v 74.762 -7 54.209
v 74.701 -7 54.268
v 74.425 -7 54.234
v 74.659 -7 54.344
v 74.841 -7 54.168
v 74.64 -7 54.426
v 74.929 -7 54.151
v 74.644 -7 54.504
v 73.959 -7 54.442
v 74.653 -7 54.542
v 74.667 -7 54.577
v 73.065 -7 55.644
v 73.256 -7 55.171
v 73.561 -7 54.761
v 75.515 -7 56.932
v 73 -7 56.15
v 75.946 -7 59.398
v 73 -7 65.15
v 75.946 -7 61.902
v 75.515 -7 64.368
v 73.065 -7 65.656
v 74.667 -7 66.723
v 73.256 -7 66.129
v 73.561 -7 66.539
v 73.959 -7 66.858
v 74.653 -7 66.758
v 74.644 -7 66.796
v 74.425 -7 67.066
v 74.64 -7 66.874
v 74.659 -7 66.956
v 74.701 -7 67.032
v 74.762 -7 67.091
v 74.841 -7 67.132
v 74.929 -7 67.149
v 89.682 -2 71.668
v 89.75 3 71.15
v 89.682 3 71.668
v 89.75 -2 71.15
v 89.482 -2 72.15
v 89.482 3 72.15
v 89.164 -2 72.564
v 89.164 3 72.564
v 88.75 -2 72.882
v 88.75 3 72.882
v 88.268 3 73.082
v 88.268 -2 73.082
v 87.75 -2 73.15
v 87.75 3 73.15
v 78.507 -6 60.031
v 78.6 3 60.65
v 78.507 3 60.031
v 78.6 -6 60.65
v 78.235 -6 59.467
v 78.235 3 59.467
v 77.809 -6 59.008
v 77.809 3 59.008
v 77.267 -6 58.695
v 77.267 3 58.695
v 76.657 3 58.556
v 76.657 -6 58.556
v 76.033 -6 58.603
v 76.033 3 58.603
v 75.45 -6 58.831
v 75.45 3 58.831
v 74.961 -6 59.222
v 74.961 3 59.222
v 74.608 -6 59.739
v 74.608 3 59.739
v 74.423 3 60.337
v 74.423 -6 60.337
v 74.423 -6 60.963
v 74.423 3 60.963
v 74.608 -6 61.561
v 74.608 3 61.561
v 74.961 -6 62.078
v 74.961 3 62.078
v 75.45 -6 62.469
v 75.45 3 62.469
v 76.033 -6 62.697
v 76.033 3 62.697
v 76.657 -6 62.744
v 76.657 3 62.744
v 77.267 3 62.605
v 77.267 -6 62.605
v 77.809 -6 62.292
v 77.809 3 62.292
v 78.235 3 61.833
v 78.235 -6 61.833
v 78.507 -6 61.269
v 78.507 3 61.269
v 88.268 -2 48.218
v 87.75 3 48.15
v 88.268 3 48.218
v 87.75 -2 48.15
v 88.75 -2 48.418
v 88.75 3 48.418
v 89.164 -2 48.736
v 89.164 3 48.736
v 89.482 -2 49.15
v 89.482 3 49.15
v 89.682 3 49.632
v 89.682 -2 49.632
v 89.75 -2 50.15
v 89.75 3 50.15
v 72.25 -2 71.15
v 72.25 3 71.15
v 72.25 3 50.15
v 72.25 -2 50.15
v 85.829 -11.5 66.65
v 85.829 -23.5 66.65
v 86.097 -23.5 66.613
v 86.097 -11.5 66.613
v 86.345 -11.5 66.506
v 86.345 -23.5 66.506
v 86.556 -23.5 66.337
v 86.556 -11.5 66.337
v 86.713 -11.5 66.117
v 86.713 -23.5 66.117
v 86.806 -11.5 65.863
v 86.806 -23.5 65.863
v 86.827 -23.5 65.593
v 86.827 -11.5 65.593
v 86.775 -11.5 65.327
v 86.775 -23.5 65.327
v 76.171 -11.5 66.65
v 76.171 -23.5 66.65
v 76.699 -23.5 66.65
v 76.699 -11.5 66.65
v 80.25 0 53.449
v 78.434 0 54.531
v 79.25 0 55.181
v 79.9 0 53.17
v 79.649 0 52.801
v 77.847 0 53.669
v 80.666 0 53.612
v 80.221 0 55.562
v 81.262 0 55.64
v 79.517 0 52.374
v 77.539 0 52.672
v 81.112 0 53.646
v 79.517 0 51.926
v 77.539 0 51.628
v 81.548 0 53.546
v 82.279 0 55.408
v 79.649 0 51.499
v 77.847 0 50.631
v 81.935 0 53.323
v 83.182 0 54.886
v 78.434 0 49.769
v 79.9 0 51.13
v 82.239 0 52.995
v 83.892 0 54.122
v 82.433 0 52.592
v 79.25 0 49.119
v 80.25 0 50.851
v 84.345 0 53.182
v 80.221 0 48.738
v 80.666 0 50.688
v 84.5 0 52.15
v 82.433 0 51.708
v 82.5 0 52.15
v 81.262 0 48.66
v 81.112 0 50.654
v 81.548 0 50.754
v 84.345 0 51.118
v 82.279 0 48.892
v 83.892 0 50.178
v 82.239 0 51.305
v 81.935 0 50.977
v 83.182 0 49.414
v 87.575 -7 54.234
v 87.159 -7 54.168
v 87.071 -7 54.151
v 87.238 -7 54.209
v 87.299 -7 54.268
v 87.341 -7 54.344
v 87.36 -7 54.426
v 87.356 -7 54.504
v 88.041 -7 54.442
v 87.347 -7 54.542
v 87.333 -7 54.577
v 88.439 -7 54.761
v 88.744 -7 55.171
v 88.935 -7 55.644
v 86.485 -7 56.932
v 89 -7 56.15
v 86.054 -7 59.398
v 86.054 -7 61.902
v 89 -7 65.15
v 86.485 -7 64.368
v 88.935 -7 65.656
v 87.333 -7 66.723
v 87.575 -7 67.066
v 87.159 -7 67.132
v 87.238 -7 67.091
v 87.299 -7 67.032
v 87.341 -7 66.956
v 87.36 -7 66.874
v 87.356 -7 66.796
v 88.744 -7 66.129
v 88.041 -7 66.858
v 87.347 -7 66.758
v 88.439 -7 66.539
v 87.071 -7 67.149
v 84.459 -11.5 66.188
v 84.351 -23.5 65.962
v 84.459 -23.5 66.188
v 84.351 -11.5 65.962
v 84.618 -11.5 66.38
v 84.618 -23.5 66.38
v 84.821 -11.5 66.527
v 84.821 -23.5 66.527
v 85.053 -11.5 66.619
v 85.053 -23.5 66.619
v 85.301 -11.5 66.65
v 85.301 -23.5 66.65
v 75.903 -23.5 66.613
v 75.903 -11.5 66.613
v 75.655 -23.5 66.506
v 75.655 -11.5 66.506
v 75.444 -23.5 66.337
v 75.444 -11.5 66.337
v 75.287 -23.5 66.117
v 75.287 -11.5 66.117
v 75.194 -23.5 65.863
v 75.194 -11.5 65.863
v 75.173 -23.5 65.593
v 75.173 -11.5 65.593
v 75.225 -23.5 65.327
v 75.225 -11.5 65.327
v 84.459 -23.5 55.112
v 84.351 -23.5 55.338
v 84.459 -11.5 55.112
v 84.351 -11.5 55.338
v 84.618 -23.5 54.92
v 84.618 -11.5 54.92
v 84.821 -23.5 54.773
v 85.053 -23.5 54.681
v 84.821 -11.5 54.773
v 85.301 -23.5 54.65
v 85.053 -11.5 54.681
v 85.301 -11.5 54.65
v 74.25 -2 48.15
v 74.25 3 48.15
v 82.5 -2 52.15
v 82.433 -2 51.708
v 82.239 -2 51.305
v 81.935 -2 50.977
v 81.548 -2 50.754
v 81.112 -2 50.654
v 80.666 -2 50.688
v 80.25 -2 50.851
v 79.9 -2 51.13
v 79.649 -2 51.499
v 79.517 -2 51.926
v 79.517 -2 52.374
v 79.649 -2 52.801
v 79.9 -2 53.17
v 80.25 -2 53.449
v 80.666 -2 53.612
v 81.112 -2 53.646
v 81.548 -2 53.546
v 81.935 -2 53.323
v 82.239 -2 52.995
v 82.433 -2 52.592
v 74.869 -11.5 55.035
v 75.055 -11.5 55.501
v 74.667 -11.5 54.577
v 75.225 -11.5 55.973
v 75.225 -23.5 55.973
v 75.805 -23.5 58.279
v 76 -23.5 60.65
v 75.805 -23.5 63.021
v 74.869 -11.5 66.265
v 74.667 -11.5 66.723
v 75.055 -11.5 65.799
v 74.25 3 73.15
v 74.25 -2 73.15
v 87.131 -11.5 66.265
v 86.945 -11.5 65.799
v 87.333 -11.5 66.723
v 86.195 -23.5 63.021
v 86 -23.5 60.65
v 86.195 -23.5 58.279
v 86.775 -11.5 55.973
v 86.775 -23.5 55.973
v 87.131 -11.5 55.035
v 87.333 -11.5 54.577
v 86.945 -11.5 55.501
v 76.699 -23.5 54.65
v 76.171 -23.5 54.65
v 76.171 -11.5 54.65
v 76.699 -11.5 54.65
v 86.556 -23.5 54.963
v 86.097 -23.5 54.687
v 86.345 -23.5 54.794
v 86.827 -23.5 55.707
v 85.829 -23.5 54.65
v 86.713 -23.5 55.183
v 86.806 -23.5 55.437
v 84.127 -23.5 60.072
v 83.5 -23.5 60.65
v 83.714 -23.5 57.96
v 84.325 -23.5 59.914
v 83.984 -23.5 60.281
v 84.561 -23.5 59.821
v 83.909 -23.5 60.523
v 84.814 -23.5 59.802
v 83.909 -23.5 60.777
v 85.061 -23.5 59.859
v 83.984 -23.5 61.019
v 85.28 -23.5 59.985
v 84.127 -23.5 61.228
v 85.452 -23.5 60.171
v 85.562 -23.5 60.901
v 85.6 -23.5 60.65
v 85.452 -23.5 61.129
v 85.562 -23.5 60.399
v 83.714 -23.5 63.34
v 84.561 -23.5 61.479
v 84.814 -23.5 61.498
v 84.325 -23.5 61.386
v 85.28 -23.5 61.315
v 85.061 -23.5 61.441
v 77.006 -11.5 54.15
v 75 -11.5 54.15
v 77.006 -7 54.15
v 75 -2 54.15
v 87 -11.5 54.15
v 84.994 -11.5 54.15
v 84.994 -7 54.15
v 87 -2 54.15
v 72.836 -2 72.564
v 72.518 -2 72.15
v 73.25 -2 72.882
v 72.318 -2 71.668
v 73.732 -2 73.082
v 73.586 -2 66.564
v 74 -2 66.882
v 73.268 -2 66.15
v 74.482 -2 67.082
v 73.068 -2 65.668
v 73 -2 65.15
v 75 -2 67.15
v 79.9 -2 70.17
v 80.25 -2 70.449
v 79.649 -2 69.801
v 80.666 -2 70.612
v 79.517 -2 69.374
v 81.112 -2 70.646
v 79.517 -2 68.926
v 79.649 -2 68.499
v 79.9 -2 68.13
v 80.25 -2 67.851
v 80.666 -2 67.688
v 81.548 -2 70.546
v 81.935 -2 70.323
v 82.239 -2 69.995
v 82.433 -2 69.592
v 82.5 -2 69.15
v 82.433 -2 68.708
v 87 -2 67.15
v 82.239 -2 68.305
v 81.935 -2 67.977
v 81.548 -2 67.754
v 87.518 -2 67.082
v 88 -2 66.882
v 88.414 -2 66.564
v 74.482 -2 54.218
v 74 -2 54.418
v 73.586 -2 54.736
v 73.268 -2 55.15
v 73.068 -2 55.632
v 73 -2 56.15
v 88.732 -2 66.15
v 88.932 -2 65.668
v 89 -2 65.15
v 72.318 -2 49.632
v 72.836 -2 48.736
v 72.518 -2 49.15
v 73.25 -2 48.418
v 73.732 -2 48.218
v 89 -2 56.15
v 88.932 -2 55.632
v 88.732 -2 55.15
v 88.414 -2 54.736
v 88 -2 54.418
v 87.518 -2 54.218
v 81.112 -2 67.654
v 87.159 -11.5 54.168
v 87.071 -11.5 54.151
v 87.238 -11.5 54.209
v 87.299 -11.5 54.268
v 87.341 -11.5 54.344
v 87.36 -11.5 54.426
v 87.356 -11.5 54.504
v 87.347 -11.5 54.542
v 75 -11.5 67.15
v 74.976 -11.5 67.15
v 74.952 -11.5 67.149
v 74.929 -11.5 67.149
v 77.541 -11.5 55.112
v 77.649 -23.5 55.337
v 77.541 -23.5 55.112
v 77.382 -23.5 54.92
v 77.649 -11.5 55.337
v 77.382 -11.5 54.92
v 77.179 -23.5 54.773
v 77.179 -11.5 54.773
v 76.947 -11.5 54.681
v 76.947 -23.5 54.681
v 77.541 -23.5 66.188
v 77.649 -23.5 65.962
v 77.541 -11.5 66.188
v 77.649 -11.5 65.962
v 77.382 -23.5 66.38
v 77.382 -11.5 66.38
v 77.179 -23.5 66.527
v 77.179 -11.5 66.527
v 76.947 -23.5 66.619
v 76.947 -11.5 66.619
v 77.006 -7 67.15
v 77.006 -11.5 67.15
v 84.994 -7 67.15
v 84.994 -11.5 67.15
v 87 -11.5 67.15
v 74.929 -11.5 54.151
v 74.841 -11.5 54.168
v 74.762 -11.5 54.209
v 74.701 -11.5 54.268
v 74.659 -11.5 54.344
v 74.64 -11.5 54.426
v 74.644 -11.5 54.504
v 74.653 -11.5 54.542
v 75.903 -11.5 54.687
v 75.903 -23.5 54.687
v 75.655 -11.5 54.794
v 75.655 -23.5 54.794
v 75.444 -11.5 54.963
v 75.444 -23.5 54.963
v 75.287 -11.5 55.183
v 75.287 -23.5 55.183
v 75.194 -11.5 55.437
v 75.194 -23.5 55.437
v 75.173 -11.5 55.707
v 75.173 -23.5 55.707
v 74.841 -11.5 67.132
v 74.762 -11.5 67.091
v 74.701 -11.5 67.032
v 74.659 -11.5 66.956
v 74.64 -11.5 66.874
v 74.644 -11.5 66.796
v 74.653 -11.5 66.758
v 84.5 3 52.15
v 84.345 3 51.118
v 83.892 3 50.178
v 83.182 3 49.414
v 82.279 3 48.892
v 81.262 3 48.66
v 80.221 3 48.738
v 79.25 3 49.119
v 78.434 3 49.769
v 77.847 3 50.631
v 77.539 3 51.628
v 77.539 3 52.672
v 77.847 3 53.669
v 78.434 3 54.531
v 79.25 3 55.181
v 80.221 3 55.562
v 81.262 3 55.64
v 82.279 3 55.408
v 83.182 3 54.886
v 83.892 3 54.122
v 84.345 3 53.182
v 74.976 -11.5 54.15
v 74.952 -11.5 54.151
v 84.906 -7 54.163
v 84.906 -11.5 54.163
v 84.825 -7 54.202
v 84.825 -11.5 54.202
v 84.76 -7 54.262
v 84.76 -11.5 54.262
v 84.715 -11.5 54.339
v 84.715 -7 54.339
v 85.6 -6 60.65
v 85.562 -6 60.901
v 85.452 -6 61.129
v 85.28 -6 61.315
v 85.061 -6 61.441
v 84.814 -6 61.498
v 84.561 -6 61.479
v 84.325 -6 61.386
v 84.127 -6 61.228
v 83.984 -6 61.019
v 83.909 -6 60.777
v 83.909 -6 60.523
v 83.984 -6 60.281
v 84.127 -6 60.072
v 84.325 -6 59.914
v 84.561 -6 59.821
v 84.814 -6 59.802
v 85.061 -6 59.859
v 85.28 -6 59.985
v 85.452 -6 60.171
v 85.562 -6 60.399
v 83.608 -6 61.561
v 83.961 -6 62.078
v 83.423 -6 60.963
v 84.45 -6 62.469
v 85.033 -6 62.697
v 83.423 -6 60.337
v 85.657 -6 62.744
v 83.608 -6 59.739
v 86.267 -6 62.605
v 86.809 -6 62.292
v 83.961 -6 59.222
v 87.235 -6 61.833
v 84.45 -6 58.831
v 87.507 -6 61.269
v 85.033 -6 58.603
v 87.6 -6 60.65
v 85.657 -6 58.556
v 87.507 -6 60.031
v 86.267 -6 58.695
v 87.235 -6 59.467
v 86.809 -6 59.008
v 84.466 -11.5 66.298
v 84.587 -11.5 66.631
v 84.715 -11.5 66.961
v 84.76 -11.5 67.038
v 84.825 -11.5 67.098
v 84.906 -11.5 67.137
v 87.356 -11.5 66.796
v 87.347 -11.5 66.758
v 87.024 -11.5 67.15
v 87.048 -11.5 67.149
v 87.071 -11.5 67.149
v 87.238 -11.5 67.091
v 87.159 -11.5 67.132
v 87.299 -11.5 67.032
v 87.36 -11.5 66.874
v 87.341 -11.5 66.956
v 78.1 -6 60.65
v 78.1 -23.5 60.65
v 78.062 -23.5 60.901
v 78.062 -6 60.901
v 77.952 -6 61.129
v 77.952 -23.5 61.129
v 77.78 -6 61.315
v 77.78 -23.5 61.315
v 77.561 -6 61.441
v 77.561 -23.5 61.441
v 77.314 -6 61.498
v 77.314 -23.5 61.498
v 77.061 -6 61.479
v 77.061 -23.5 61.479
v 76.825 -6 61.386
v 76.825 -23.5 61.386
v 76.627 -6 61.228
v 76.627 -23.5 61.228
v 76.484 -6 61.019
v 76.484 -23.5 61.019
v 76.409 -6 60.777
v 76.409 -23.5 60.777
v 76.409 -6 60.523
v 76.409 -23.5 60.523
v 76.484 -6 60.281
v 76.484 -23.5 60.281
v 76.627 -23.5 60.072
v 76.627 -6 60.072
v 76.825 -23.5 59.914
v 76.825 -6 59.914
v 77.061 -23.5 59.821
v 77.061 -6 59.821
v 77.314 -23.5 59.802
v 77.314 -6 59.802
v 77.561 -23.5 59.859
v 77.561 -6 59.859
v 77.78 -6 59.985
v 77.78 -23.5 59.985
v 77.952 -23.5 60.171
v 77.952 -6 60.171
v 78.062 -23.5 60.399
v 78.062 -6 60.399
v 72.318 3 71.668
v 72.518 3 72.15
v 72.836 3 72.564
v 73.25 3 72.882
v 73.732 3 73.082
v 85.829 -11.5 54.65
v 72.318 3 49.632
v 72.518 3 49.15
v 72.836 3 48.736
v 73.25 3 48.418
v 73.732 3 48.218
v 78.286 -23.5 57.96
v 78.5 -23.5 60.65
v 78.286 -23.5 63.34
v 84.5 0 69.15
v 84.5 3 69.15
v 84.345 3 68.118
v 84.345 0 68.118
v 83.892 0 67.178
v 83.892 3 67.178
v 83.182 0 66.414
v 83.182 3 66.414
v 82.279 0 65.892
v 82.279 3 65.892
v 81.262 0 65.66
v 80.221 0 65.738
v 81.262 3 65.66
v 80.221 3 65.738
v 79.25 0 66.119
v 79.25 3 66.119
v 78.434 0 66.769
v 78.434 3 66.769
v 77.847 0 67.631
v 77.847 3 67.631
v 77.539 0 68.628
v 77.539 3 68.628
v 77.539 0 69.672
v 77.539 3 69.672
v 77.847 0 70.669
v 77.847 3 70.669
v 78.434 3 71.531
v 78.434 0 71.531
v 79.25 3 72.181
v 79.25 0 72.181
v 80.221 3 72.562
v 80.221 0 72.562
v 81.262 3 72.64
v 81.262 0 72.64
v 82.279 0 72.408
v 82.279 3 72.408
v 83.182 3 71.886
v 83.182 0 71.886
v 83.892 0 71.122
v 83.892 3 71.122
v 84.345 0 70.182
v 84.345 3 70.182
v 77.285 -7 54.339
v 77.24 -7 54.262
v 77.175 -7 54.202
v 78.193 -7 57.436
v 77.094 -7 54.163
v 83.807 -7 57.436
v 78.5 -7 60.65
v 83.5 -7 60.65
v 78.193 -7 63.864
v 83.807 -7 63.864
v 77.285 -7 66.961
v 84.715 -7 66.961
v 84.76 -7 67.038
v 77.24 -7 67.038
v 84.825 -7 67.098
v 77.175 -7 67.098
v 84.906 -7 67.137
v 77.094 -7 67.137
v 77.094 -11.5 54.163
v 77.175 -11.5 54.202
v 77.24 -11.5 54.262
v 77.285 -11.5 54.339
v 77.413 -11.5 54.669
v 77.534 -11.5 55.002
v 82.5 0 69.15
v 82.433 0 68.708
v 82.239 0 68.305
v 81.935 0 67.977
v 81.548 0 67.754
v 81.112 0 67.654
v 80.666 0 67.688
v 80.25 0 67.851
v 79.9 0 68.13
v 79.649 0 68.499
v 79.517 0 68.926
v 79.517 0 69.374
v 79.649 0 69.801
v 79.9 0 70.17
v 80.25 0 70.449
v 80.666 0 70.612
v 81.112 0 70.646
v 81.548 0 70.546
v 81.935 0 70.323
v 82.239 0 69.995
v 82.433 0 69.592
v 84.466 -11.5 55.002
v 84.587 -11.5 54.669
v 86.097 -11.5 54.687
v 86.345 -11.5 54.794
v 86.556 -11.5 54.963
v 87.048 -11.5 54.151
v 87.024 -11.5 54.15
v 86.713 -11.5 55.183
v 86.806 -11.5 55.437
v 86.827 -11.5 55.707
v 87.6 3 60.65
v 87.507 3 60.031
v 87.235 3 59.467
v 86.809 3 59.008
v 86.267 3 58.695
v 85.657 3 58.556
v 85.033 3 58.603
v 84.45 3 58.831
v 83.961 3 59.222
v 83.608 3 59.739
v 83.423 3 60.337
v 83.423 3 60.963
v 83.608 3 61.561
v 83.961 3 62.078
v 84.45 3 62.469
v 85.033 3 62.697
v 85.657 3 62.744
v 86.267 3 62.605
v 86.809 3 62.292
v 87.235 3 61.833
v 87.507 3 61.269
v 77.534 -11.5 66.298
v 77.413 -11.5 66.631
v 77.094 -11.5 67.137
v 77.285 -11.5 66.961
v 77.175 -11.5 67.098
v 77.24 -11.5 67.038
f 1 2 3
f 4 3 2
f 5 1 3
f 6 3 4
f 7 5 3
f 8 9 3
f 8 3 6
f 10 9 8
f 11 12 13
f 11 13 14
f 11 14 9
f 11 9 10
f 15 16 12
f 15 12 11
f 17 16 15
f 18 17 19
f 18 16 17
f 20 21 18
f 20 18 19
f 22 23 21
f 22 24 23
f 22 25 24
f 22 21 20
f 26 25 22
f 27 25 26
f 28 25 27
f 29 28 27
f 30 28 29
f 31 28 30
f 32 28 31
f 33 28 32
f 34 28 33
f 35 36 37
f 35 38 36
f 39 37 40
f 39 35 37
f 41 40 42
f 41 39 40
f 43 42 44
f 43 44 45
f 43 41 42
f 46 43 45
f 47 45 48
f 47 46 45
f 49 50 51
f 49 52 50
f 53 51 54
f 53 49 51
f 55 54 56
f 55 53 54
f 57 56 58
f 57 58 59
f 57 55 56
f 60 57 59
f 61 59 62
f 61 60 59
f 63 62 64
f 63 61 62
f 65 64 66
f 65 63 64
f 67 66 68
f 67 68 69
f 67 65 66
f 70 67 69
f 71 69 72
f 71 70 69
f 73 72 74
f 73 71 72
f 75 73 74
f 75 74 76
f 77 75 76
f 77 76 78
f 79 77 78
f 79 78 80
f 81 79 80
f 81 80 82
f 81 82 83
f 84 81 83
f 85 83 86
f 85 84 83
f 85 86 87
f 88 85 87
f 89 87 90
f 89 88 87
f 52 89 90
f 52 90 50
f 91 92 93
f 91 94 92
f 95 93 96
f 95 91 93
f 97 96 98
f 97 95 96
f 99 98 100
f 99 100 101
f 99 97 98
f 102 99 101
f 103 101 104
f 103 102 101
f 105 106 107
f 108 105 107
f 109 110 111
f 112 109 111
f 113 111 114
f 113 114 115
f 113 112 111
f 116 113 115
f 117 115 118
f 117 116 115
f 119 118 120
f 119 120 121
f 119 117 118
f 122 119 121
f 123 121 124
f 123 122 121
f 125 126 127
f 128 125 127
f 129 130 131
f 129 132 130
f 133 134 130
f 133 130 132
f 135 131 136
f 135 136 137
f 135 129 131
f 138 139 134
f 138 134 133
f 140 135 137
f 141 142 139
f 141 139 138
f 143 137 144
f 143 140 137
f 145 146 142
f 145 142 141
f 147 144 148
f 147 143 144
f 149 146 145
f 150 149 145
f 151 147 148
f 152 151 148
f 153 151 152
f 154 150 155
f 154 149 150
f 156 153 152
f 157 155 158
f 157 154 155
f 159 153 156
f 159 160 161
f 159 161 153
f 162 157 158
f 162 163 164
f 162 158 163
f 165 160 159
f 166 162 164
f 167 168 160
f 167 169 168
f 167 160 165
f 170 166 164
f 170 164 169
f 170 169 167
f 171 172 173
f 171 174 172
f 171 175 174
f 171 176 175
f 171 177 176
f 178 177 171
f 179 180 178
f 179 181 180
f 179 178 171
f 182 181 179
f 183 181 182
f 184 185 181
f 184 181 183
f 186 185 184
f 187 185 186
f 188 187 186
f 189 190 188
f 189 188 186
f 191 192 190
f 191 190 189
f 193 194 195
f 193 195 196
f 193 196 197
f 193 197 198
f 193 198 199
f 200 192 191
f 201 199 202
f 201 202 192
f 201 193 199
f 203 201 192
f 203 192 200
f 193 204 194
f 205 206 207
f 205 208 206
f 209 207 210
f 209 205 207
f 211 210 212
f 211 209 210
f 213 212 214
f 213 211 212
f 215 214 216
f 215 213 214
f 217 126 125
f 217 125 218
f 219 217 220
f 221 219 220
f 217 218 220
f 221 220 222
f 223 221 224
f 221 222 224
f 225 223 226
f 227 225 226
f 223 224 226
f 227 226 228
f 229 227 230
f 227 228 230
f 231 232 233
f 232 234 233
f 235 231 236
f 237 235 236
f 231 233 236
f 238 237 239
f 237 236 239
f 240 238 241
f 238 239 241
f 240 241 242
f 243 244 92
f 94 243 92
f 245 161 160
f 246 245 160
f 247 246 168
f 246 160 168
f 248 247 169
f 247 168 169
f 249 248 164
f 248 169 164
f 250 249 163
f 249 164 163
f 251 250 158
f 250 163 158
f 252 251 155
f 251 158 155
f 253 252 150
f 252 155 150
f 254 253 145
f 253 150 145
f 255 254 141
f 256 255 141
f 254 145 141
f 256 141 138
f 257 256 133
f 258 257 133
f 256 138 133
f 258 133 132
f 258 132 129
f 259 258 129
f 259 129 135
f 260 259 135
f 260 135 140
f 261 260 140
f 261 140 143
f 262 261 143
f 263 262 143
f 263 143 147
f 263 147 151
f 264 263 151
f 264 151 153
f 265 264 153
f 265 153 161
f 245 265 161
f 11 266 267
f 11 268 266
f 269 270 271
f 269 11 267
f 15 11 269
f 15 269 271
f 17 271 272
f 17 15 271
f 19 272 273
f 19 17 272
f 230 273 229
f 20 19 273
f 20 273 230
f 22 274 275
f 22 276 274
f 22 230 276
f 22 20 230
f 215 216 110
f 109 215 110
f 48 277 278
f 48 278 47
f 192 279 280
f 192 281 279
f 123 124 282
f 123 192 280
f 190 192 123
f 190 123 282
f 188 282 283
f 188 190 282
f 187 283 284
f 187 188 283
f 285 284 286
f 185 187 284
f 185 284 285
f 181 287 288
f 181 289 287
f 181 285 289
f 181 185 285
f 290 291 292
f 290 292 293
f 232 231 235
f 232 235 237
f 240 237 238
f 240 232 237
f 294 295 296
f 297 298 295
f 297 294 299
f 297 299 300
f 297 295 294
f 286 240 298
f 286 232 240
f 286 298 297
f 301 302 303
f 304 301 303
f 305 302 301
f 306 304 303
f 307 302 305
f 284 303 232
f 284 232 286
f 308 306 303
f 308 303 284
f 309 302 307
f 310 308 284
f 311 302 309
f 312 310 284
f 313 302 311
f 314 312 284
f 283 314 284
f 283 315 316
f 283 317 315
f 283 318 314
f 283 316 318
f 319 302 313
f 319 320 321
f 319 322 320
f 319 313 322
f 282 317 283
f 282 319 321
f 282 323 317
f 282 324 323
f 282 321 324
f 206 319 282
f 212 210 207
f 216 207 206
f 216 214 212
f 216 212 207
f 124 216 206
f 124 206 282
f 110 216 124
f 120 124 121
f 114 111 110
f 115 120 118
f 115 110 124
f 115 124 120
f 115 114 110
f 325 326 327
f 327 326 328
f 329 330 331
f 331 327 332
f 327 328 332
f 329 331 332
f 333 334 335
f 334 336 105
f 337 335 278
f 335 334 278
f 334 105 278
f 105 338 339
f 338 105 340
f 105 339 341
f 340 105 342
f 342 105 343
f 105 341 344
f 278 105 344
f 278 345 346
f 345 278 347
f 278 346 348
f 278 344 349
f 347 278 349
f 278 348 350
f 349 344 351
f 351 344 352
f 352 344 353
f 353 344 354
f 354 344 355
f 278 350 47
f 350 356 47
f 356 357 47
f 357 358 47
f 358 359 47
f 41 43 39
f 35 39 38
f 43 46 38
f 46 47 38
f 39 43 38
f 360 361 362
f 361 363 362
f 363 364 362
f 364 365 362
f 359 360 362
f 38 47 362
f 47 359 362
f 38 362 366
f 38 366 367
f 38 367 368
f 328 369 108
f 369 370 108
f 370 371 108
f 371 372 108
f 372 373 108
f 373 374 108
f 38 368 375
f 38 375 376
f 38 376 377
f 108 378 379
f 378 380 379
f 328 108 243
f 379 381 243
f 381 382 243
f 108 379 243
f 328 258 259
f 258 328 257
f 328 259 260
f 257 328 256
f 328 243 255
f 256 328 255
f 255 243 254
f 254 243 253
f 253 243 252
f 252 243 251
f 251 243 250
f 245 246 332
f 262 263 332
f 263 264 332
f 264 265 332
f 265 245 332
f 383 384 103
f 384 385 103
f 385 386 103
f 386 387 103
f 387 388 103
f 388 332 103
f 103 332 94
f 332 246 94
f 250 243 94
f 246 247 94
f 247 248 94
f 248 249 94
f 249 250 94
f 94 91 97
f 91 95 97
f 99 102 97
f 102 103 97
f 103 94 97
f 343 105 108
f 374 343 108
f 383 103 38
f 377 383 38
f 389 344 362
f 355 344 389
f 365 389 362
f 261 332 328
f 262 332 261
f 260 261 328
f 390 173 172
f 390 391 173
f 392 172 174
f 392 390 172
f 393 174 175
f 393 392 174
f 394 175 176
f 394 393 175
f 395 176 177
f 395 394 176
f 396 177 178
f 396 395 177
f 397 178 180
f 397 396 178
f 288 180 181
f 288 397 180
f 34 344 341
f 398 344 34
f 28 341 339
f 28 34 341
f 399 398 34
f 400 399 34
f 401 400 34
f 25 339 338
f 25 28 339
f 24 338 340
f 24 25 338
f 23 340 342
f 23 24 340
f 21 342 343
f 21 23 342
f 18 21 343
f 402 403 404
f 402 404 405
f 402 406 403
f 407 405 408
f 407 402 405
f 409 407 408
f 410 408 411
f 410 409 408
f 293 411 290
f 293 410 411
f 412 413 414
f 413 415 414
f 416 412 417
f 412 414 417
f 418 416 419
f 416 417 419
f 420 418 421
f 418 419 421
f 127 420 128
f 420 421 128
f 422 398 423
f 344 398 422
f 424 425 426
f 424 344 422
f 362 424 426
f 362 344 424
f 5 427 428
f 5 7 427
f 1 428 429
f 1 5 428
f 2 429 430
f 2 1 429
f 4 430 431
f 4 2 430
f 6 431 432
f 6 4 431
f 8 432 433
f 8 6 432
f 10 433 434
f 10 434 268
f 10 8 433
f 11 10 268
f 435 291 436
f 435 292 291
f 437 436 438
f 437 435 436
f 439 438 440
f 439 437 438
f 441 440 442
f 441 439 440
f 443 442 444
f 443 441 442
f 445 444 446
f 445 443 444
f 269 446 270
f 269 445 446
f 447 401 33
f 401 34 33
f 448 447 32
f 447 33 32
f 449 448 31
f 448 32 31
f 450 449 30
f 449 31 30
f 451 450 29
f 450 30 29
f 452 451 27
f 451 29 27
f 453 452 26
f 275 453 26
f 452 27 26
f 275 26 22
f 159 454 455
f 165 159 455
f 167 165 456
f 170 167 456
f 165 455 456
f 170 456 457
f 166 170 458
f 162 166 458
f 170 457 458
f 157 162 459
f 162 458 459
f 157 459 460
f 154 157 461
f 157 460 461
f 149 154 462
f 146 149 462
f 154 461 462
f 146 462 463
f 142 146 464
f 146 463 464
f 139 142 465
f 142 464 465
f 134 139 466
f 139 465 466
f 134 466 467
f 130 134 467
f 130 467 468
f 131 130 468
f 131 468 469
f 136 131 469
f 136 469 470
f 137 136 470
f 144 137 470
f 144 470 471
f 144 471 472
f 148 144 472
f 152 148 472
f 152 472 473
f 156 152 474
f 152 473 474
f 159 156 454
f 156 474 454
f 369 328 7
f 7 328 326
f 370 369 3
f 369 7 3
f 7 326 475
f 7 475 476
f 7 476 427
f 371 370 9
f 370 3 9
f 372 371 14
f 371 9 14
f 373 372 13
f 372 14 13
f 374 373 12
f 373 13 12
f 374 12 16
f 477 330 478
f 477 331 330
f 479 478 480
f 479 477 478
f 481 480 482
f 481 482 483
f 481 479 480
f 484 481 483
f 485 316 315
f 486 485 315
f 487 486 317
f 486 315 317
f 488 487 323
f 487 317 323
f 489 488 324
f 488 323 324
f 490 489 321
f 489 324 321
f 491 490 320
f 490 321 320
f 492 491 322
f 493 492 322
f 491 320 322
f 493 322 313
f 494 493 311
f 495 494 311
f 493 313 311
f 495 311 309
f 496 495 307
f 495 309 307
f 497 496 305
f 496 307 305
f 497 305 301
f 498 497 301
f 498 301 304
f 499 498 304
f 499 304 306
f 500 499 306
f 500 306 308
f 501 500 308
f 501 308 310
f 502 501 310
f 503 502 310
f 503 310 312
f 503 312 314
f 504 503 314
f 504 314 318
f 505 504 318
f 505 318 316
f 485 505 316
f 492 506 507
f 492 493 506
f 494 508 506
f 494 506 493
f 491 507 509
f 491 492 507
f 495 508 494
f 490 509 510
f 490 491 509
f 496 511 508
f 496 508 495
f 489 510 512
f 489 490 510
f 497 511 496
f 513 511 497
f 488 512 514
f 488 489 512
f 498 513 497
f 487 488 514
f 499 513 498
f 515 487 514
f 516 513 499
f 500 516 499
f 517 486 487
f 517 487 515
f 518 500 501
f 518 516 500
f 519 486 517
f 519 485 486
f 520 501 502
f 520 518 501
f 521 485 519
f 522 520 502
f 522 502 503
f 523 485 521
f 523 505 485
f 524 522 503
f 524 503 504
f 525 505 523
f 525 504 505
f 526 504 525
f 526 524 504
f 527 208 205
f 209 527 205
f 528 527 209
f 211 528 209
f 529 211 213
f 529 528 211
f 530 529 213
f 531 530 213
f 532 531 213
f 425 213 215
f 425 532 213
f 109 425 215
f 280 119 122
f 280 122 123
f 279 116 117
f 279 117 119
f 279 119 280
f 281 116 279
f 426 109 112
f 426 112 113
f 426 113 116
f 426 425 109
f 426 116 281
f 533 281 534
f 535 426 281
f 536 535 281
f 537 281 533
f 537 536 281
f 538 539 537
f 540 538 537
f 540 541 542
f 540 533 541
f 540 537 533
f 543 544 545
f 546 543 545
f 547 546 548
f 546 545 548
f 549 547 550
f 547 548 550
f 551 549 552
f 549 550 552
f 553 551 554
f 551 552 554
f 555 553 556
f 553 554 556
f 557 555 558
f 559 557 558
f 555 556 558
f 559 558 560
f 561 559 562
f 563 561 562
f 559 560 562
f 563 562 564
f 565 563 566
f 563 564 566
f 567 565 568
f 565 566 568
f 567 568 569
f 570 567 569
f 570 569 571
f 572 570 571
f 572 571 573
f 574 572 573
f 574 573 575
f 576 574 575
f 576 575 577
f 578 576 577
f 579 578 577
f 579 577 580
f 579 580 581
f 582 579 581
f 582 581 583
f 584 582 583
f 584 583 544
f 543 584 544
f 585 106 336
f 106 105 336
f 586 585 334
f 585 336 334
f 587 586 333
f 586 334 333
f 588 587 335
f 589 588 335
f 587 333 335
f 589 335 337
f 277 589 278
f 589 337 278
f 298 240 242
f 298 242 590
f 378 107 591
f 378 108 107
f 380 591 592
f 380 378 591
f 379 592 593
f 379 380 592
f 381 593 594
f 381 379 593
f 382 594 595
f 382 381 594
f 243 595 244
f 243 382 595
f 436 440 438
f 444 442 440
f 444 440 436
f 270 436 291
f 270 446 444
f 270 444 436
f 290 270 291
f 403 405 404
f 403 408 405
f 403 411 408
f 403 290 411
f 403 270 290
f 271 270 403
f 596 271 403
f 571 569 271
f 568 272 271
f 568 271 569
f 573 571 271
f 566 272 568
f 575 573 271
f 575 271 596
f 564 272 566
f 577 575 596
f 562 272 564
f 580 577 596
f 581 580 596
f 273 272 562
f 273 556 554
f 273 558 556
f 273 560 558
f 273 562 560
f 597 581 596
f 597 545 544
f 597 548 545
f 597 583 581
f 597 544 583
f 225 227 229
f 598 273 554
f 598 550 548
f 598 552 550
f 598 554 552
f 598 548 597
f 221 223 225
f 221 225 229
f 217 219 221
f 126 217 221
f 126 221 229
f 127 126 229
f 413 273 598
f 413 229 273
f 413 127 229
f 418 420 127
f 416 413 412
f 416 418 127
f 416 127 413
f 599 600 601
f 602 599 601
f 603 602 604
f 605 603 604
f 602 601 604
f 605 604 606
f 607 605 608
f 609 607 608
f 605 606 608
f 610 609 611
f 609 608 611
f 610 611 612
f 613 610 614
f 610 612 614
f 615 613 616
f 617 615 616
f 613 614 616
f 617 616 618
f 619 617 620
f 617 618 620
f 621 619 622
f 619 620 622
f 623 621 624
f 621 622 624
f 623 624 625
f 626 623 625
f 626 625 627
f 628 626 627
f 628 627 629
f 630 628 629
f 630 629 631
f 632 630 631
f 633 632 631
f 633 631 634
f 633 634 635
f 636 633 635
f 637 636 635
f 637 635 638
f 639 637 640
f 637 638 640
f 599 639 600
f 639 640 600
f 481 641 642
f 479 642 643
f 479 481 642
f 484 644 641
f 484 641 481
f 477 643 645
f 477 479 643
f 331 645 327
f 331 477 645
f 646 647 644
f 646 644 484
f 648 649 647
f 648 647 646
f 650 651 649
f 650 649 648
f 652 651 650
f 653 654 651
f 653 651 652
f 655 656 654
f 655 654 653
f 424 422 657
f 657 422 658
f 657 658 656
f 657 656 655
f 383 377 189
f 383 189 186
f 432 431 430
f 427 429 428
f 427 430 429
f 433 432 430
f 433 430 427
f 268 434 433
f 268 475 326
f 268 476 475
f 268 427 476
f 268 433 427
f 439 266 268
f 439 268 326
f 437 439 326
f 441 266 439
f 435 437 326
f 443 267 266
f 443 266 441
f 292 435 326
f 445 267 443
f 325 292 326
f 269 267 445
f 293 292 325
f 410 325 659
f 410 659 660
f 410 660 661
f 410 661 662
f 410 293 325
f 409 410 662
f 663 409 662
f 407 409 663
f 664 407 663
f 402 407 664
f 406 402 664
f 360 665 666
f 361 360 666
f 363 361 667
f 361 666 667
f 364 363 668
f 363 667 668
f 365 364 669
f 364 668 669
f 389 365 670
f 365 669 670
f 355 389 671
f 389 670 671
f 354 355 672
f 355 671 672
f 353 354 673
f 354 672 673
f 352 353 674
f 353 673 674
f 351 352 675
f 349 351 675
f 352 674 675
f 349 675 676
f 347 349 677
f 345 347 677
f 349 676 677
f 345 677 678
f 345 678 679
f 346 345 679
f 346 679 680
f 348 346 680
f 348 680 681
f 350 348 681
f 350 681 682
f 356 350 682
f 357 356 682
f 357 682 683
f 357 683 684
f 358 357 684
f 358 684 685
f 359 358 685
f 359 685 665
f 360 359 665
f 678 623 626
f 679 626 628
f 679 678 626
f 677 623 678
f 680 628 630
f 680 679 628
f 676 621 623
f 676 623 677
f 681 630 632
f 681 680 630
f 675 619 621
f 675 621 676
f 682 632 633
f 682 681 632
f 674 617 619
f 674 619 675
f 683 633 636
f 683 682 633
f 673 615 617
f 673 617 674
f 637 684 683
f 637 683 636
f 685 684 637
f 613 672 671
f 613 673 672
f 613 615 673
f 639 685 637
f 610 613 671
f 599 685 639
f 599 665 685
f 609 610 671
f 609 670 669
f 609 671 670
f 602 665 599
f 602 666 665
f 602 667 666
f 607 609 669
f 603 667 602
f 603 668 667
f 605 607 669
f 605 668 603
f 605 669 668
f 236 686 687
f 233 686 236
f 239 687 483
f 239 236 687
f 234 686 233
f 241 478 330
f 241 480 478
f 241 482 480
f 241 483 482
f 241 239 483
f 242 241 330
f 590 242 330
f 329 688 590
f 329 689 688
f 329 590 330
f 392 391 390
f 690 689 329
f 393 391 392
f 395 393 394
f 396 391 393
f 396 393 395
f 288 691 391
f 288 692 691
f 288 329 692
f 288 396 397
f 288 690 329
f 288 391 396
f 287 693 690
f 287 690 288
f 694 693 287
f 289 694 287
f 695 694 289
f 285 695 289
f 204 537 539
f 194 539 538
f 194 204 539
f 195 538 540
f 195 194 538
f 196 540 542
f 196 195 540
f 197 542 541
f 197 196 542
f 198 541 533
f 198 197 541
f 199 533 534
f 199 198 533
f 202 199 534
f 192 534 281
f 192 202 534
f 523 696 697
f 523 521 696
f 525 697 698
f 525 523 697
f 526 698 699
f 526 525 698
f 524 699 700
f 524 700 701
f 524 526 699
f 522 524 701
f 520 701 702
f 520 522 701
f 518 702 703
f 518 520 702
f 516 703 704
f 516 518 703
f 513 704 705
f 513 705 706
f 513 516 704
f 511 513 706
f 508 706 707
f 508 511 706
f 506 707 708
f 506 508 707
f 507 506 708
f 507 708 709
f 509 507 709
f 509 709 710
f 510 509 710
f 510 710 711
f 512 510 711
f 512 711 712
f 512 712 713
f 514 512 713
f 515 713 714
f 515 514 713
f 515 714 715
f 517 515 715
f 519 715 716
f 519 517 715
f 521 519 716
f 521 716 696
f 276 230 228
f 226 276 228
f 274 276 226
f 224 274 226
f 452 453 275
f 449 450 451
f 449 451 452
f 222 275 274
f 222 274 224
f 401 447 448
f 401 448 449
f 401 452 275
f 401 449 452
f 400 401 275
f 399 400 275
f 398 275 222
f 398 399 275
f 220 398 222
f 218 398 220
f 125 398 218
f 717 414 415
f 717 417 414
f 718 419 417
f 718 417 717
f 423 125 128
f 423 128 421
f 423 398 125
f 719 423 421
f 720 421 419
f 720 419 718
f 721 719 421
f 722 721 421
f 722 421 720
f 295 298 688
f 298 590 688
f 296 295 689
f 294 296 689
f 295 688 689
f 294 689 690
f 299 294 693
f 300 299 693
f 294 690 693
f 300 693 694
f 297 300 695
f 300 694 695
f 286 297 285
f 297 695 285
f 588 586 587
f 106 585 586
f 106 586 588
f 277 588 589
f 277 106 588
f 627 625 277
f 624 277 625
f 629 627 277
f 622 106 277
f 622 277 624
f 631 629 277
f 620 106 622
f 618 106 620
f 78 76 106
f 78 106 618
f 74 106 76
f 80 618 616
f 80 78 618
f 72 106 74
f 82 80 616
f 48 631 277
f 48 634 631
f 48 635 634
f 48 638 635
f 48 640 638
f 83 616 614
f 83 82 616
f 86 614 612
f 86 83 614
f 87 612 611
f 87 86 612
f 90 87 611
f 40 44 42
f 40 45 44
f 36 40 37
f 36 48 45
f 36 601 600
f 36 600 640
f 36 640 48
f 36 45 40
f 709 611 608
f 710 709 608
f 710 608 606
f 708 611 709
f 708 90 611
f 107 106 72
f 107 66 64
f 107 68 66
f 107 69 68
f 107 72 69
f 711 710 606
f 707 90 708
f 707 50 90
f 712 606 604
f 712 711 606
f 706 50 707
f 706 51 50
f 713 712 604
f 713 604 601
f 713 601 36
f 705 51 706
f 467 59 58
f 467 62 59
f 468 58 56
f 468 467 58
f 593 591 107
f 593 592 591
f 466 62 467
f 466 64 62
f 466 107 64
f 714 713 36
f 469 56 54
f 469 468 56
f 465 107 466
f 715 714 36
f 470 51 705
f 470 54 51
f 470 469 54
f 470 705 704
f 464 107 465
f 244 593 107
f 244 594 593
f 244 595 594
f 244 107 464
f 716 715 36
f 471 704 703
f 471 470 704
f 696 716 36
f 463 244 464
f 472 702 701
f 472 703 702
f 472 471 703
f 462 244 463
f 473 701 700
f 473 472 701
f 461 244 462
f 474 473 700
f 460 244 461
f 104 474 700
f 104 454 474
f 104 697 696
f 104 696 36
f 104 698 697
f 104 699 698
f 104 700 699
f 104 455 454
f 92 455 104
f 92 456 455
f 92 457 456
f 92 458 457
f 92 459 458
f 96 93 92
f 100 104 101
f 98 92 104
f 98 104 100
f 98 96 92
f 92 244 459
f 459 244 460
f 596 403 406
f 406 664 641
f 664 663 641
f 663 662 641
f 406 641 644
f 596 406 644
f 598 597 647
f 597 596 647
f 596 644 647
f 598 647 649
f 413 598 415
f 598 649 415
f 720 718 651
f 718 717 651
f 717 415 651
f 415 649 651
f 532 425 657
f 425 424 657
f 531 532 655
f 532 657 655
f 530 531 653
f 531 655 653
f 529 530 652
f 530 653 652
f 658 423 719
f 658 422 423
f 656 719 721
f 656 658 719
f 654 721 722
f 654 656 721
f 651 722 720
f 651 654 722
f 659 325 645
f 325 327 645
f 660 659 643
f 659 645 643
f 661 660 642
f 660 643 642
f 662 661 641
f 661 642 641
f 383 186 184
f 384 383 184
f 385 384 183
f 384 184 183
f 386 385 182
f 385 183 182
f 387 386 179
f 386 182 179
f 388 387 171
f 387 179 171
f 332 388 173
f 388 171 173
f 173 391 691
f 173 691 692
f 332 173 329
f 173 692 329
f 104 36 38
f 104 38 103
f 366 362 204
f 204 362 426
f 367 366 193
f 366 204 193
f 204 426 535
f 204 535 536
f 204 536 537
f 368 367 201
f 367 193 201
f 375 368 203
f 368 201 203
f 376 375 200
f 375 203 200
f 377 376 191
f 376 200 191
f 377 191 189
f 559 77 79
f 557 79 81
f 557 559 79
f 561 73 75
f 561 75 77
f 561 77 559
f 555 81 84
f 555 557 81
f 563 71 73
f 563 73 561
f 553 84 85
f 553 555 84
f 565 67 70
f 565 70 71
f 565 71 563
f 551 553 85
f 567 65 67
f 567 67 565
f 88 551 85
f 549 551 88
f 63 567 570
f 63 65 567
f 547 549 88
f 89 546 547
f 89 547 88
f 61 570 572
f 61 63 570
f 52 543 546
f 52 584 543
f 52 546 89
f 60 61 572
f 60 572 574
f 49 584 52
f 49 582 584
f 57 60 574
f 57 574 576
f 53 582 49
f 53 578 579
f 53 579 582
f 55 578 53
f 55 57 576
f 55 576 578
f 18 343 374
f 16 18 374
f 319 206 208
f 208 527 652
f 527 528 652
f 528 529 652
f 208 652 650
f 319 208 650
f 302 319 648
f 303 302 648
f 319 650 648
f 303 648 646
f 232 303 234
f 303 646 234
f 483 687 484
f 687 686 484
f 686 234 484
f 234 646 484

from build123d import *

# Parameters (mm, degrees)
SKETCH1_W           = 123.5
SKETCH1_H           = 81.5
BOSS_EXTRUDE1_DEPTH = 8
CHAMFER1_SIZE       = 10
SKETCH2_W           = 130
SKETCH2_H           = 88
BOSS_EXTRUDE2_DEPTH = 9
FILLET1_R           = 2
SKETCH3_W           = 124
SKETCH3_H           = 82
CUT_EXTRUDE1_DEPTH  = 2
FILLET2_R           = 2
SKETCH4_R           = 10
CUT_EXTRUDE2_DEPTH  = 18
SKETCH5_R           = 17
SKETCH5_R_2         = 14.5
BOSS_EXTRUDE3_DEPTH = 16.5
SKETCH6_W           = 170
SKETCH6_H           = 36.5
SKETCH6_W_2         = 114
SKETCH6_H_2         = 12
CUT_EXTRUDE3_DEPTH  = 12
FILLET3_R           = 1
SKETCH7_R           = 0.85
CUT_EXTRUDE4_DEPTH  = 20.75
SKETCH11_W          = 130
SKETCH11_H          = 10
CUT_EXTRUDE8_DEPTH  = 85.75
SKETCH13_R          = 2.1
CUT_EXTRUDE9_DEPTH  = 6
SKETCH15_R          = 2.1
SKETCH15_R_2        = 10
BOSS_EXTRUDE4_DEPTH = 3
SKETCH16_W          = 167.35282603
SKETCH16_H          = 111.231485579
SKETCH16_W_2        = 17.5
SKETCH16_H_2        = 25
CUT_EXTRUDE10_DEPTH = 27.5
CUT_EXTRUDE11_START = -5
SKETCH17_W          = 17.5
SKETCH17_H          = 25
SKETCH17_W_2        = 16
SKETCH17_H_2        = 13
CUT_EXTRUDE11_DEPTH = 22.5
FILLET4_R           = 2
SKETCH18_R          = 1.5
CUT_EXTRUDE12_DEPTH = 10
SKETCH19_R          = 3.5
CUT_EXTRUDE13_DEPTH = 3
FILLET5_R           = 0.3


with BuildPart() as part:
    # Sketch1 → Boss-Extrude1 (new body)
    with BuildSketch(Plane(origin=(0, 0, 0), x_dir=(1, 0, 0), z_dir=(0, 1, 0))):
        with Locations((61.75, -40.75)):
            Rectangle(SKETCH1_W, SKETCH1_H)
    extrude(amount=BOSS_EXTRUDE1_DEPTH)

    # Chamfer1
    chamfer1_edges = [part.edges().sort_by_distance(p)[0] for p in [
        (123.5, 4, 0),
        (123.5, 4, 81.5),
    ]]
    chamfer(chamfer1_edges, length=CHAMFER1_SIZE)

    # Sketch2 → Boss-Extrude2 (add)
    with BuildSketch(Plane.XZ):
        with Locations((61.75, 40.75)):
            Rectangle(SKETCH2_W, SKETCH2_H)
    extrude(amount=BOSS_EXTRUDE2_DEPTH)

    # Fillet1
    fillet1_edges = [part.edges().sort_by_distance(p)[0] for p in [
        (113.5, 4, 0),
        (123.5, 4, 71.5),
        (123.5, 4, 10),
        (113.5, 4, 81.5),
        (-3.25, -4.5, 84.75),
        (-3.25, -4.5, -3.25),
        (126.75, -4.5, -3.25),
        (126.75, -4.5, 84.75),
        (0, 4, 0),
        (0, 4, 81.5),
    ]]
    fillet(fillet1_edges, radius=FILLET1_R)

    # Sketch3 → Cut-Extrude1 (cut)
    with BuildSketch(Plane.XZ.offset(9)):
        with Locations((61.75, 40.75)):
            Rectangle(SKETCH3_W, SKETCH3_H)
    extrude(amount=-CUT_EXTRUDE1_DEPTH, mode=Mode.SUBTRACT)

    # Fillet2
    fillet2_edges = [part.edges().sort_by_distance(p)[0] for p in [
        (-0.25, -8, -0.25),
        (-0.25, -8, 81.75),
        (123.75, -8, 81.75),
        (123.75, -8, -0.25),
    ]]
    fillet(fillet2_edges, radius=FILLET2_R)

    # Sketch4 → Cut-Extrude2 (cut, through all)
    with BuildSketch(Plane(origin=(0, 8, 0), x_dir=(1, 0, 0), z_dir=(0, 1, 0))):
        with Locations((22.5, -20.85)):
            Circle(SKETCH4_R)
        with Locations((61.5, -20.85)):
            Circle(SKETCH4_R)
        with Locations((100.5, -20.85)):
            Circle(SKETCH4_R)
        with Locations((100.5, -60.65)):
            Circle(SKETCH4_R)
        with Locations((61.5, -60.65)):
            Circle(SKETCH4_R)
        with Locations((22.5, -60.65)):
            Circle(SKETCH4_R)
    extrude(amount=-CUT_EXTRUDE2_DEPTH, mode=Mode.SUBTRACT)

    # Sketch5 → Boss-Extrude3 (add)
    with BuildSketch(Plane.XZ.offset(7)):
        with Locations((22.5, 60.65)):
            Circle(SKETCH5_R)
        with Locations((22.5, 60.65)):
            Circle(SKETCH5_R_2, mode=Mode.SUBTRACT)
        with Locations((61.5, 60.65)):
            Circle(SKETCH5_R)
        with Locations((61.5, 60.65)):
            Circle(SKETCH5_R_2, mode=Mode.SUBTRACT)
        with Locations((100.5, 60.65)):
            Circle(SKETCH5_R)
        with Locations((100.5, 60.65)):
            Circle(SKETCH5_R_2, mode=Mode.SUBTRACT)
        with Locations((100.5, 20.85)):
            Circle(SKETCH5_R)
        with Locations((100.5, 20.85)):
            Circle(SKETCH5_R_2, mode=Mode.SUBTRACT)
        with Locations((61.5, 20.85)):
            Circle(SKETCH5_R)
        with Locations((61.5, 20.85)):
            Circle(SKETCH5_R_2, mode=Mode.SUBTRACT)
        with Locations((22.5, 20.85)):
            Circle(SKETCH5_R)
        with Locations((22.5, 20.85)):
            Circle(SKETCH5_R_2, mode=Mode.SUBTRACT)
    extrude(amount=BOSS_EXTRUDE3_DEPTH)

    # Sketch6 → Cut-Extrude3 (cut)
    with BuildSketch(Plane.XZ.offset(23.5)):
        with Locations((61.5, 20.85)):
            Rectangle(SKETCH6_W, SKETCH6_H)
        with Locations((61.5, 20.85)):
            Rectangle(SKETCH6_W_2, SKETCH6_H_2, mode=Mode.SUBTRACT)
        with Locations((61.5, 60.65)):
            Rectangle(SKETCH6_W, SKETCH6_H)
        with Locations((61.5, 60.65)):
            Rectangle(SKETCH6_W_2, SKETCH6_H_2, mode=Mode.SUBTRACT)
    extrude(amount=-CUT_EXTRUDE3_DEPTH, mode=Mode.SUBTRACT)

    # Fillet3
    fillet3_edges = [part.edges().sort_by_distance(p)[0] for p in [
        (87.299621218, -17.5, 66.65),
        (113.700378782, -17.5, 66.65),
        (113.700378782, -17.5, 54.65),
        (87.299621218, -17.5, 54.65),
        (9.299621218, -17.5, 54.65),
        (35.700378782, -17.5, 54.65),
        (6.594026279, -17.5, 54.65),
        (48.299621218, -17.5, 54.65),
        (74.700378782, -17.5, 54.65),
        (38.405973721, -17.5, 54.65),
        (45.594026279, -17.5, 54.65),
        (77.405973721, -17.5, 54.65),
        (84.594026279, -17.5, 54.65),
        (35.700378782, -17.5, 66.65),
        (9.299621218, -17.5, 66.65),
        (38.405973721, -17.5, 66.65),
        (45.594026279, -17.5, 66.65),
        (74.700378782, -17.5, 66.65),
        (48.299621218, -17.5, 66.65),
        (77.405973721, -17.5, 66.65),
        (84.594026279, -17.5, 66.65),
        (116.405973721, -17.5, 66.65),
        (116.405973721, -17.5, 54.65),
        (6.594026279, -17.5, 66.65),
        (35.700378782, -17.5, 14.85),
        (9.299621218, -17.5, 14.85),
        (9.299621218, -17.5, 26.85),
        (35.700378782, -17.5, 26.85),
        (113.700378782, -17.5, 26.85),
        (87.299621218, -17.5, 26.85),
        (116.405973721, -17.5, 26.85),
        (74.700378782, -17.5, 26.85),
        (48.299621218, -17.5, 26.85),
        (84.594026279, -17.5, 26.85),
        (77.405973721, -17.5, 26.85),
        (45.594026279, -17.5, 26.85),
        (38.405973721, -17.5, 26.85),
        (87.299621218, -17.5, 14.85),
        (113.700378782, -17.5, 14.85),
        (84.594026279, -17.5, 14.85),
        (77.405973721, -17.5, 14.85),
        (48.299621218, -17.5, 14.85),
        (74.700378782, -17.5, 14.85),
        (45.594026279, -17.5, 14.85),
        (38.405973721, -17.5, 14.85),
        (6.594026279, -17.5, 14.85),
        (6.594026279, -17.5, 26.85),
        (116.405973721, -17.5, 14.85),
    ]]
    fillet(fillet3_edges, radius=FILLET3_R)

    # Sketch7 → Cut-Extrude4 (cut)
    with BuildSketch(Plane.XZ.offset(23.5)):
        with Locations((6.75, 20.85)):
            Circle(SKETCH7_R)
        with Locations((38.25, 20.85)):
            Circle(SKETCH7_R)
        with Locations((45.75, 20.85)):
            Circle(SKETCH7_R)
        with Locations((77.25, 20.85)):
            Circle(SKETCH7_R)
        with Locations((84.75, 20.85)):
            Circle(SKETCH7_R)
        with Locations((116.25, 20.85)):
            Circle(SKETCH7_R)
        with Locations((116.25, 60.65)):
            Circle(SKETCH7_R)
        with Locations((84.75, 60.65)):
            Circle(SKETCH7_R)
        with Locations((77.25, 60.65)):
            Circle(SKETCH7_R)
        with Locations((45.75, 60.65)):
            Circle(SKETCH7_R)
        with Locations((38.25, 60.65)):
            Circle(SKETCH7_R)
        with Locations((6.75, 60.65)):
            Circle(SKETCH7_R)
    extrude(amount=-CUT_EXTRUDE4_DEPTH, mode=Mode.SUBTRACT)

    # Sketch11 → Cut-Extrude8 (cut, through all)
    with BuildSketch(Plane(origin=(0, 0, 0), x_dir=(-1, 0, 0), z_dir=(0, 0, -1))):
        with Locations((-61.75, 5)):
            Rectangle(SKETCH11_W, SKETCH11_H)
    extrude(amount=-CUT_EXTRUDE8_DEPTH, mode=Mode.SUBTRACT)

    # Sketch13 → Cut-Extrude9 (cut)
    with BuildSketch(Plane(origin=(0, 0, 0), x_dir=(1, 0, 0), z_dir=(0, 1, 0))):
        with Locations((116.25, -60.65)):
            Circle(SKETCH13_R)
        with Locations((85.5, -60.65)):
            Circle(SKETCH13_R)
        with Locations((76.5, -60.65)):
            Circle(SKETCH13_R)
        with Locations((116.25, -20.85)):
            Circle(SKETCH13_R)
        with Locations((85.5, -20.85)):
            Circle(SKETCH13_R)
        with Locations((76.5, -20.85)):
            Circle(SKETCH13_R)
        with Locations((46.5, -20.85)):
            Circle(SKETCH13_R)
        with Locations((37.5, -20.85)):
            Circle(SKETCH13_R)
        with Locations((6.75, -20.85)):
            Circle(SKETCH13_R)
        with Locations((6.75, -60.65)):
            Circle(SKETCH13_R)
        with Locations((37.5, -60.65)):
            Circle(SKETCH13_R)
        with Locations((46.5, -60.65)):
            Circle(SKETCH13_R)
    extrude(amount=-CUT_EXTRUDE9_DEPTH, mode=Mode.SUBTRACT)

    # Sketch15 → Boss-Extrude4 (add)
    with BuildSketch(Plane(origin=(0, 0, 0), x_dir=(1, 0, 0), z_dir=(0, 1, 0))):
        with BuildLine():
            Line((126.75, -82.75), (126.75, 1.25))
            ThreePointArc((126.75, 1.25), (126.164213562, 2.664213562), (124.75, 3.25))
            Line((124.75, 3.25), (-1.25, 3.25))
            ThreePointArc((-1.25, 3.25), (-2.664213562, 2.664213562), (-3.25, 1.25))
            Line((-3.25, 1.25), (-3.25, -82.75))
            ThreePointArc((-3.25, -82.75), (-2.664213562, -84.164213562), (-1.25, -84.75))
            Line((-1.25, -84.75), (124.75, -84.75))
            ThreePointArc((124.75, -84.75), (126.164213562, -84.164213562), (126.75, -82.75))
        make_face()
        with Locations((6.75, -60.65)):
            Circle(SKETCH15_R, mode=Mode.SUBTRACT)
        with Locations((22.5, -60.65)):
            Circle(SKETCH15_R_2, mode=Mode.SUBTRACT)
        with Locations((37.5, -60.65)):
            Circle(SKETCH15_R, mode=Mode.SUBTRACT)
        with Locations((46.5, -60.65)):
            Circle(SKETCH15_R, mode=Mode.SUBTRACT)
        with Locations((61.5, -60.65)):
            Circle(SKETCH15_R_2, mode=Mode.SUBTRACT)
        with Locations((76.5, -60.65)):
            Circle(SKETCH15_R, mode=Mode.SUBTRACT)
        with Locations((100.5, -60.65)):
            Circle(SKETCH15_R_2, mode=Mode.SUBTRACT)
        with Locations((116.25, -60.65)):
            Circle(SKETCH15_R, mode=Mode.SUBTRACT)
        with Locations((116.25, -20.85)):
            Circle(SKETCH15_R, mode=Mode.SUBTRACT)
        with Locations((100.5, -20.85)):
            Circle(SKETCH15_R_2, mode=Mode.SUBTRACT)
        with Locations((85.5, -20.85)):
            Circle(SKETCH15_R, mode=Mode.SUBTRACT)
        with Locations((76.5, -20.85)):
            Circle(SKETCH15_R, mode=Mode.SUBTRACT)
        with Locations((61.5, -20.85)):
            Circle(SKETCH15_R_2, mode=Mode.SUBTRACT)
        with Locations((46.5, -20.85)):
            Circle(SKETCH15_R, mode=Mode.SUBTRACT)
        with Locations((37.5, -20.85)):
            Circle(SKETCH15_R, mode=Mode.SUBTRACT)
        with Locations((22.5, -20.85)):
            Circle(SKETCH15_R_2, mode=Mode.SUBTRACT)
        with Locations((85.5, -60.65)):
            Circle(SKETCH15_R, mode=Mode.SUBTRACT)
        with Locations((6.75, -20.85)):
            Circle(SKETCH15_R, mode=Mode.SUBTRACT)
    extrude(amount=BOSS_EXTRUDE4_DEPTH)

    # Sketch16 → Cut-Extrude10 (cut, through all)
    with BuildSketch(Plane(origin=(0, 3, 0), x_dir=(1, 0, 0), z_dir=(0, 1, 0))):
        with Locations((62.017342261, -41.761195324)):
            Rectangle(SKETCH16_W, SKETCH16_H)
        with Locations((81, -60.65)):
            Rectangle(SKETCH16_W_2, SKETCH16_H_2, mode=Mode.SUBTRACT)
    extrude(amount=-CUT_EXTRUDE10_DEPTH, mode=Mode.SUBTRACT)

    # Sketch17 → Cut-Extrude11 (cut, through all)
    with BuildSketch(Plane(origin=(0, 3, 0), x_dir=(1, 0, 0), z_dir=(0, 1, 0)).offset(CUT_EXTRUDE11_START)):
        with Locations((81, -60.65)):
            Rectangle(SKETCH17_W, SKETCH17_H)
        with Locations((81, -60.65)):
            Rectangle(SKETCH17_W_2, SKETCH17_H_2, mode=Mode.SUBTRACT)
    extrude(amount=-CUT_EXTRUDE11_DEPTH, mode=Mode.SUBTRACT)

    # Fillet4
    fillet4_edges = [part.edges().sort_by_distance(p)[0] for p in [
        (72.25, 0.5, 73.15),
        (89.75, 0.5, 73.15),
        (73, -4.5, 54.15),
        (89, -4.5, 54.15),
        (72.25, 0.5, 48.15),
        (89.75, 0.5, 48.15),
        (73, -4.5, 67.15),
        (89, -4.5, 67.15),
    ]]
    fillet(fillet4_edges, radius=FILLET4_R)

    # Sketch18 → Cut-Extrude12 (cut)
    with BuildSketch(Plane(origin=(0, 3, 0), x_dir=(1, 0, 0), z_dir=(0, 1, 0))):
        with Locations((81, -52.15)):
            Circle(SKETCH18_R)
        with Locations((81, -69.15)):
            Circle(SKETCH18_R)
    extrude(amount=-CUT_EXTRUDE12_DEPTH, mode=Mode.SUBTRACT)

    # Sketch19 → Cut-Extrude13 (cut)
    with BuildSketch(Plane(origin=(0, 3, 0), x_dir=(1, 0, 0), z_dir=(0, 1, 0))):
        with Locations((81, -52.15)):
            Circle(SKETCH19_R)
        with Locations((81, -69.15)):
            Circle(SKETCH19_R)
    extrude(amount=-CUT_EXTRUDE13_DEPTH, mode=Mode.SUBTRACT)

    # Fillet5
    fillet5_edges = [part.edges().sort_by_distance(p)[0] for p in [
        (77.208278072, -9.25, 67.15),
        (84.791721928, -9.25, 67.15),
        (84.791721928, -9.25, 54.15),
        (77.208278072, -9.25, 54.15),
        (74.493918477, -9.25, 54.215088764),
        (74.493918477, -9.25, 67.084911236),
        (87.506081523, -9.25, 54.215088764),
        (87.506081523, -9.25, 67.084911236),
    ]]
    fillet(fillet5_edges, radius=FILLET5_R)


solid = part.part
